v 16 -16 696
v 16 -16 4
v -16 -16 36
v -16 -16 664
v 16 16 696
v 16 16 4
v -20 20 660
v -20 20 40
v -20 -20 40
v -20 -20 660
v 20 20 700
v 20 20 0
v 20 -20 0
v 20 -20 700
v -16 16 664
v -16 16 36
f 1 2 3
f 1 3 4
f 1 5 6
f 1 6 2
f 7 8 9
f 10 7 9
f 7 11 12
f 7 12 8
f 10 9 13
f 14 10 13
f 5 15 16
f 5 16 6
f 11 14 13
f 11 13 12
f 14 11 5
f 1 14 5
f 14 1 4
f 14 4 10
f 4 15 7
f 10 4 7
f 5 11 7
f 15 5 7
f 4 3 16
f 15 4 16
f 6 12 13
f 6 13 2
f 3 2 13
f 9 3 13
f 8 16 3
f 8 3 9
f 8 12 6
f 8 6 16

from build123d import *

# Parameters (mm, degrees)
SKETCH1_W          = 40
SKETCH1_H          = 40
SKETCH1_W_2        = 32
SKETCH1_H_2        = 32
CUT_EXTRUDE1_DEPTH = 41.0000001


with BuildPart() as part:
    # Sweep1: sweep along a curve in space
    with BuildLine() as sweep1_path:
        add(Edge.make_bspline(
            [(0, 0, 0), (0, 0, 700)],
            knots=[0, 0, 1, 1], degree=1))
    # Sketch1 → Sweep1 (sweep)
    with BuildSketch(Plane.XY):
        Rectangle(SKETCH1_W, SKETCH1_H)
        Rectangle(SKETCH1_W_2, SKETCH1_H_2, mode=Mode.SUBTRACT)
    sweep(path=sweep1_path.line)

    # Sketch2 → Cut-Extrude1 (cut, through all)
    with BuildSketch(Plane(origin=(0, 20, 0), x_dir=(1, 0, 0), z_dir=(0, 1, 0))):
        Polygon((20, 0), (-20, -40), (-20, 0), align=None)
        Polygon((20, -700), (-20, -660), (-20, -700), align=None)
    extrude(amount=-CUT_EXTRUDE1_DEPTH, mode=Mode.SUBTRACT)


solid = part.part
